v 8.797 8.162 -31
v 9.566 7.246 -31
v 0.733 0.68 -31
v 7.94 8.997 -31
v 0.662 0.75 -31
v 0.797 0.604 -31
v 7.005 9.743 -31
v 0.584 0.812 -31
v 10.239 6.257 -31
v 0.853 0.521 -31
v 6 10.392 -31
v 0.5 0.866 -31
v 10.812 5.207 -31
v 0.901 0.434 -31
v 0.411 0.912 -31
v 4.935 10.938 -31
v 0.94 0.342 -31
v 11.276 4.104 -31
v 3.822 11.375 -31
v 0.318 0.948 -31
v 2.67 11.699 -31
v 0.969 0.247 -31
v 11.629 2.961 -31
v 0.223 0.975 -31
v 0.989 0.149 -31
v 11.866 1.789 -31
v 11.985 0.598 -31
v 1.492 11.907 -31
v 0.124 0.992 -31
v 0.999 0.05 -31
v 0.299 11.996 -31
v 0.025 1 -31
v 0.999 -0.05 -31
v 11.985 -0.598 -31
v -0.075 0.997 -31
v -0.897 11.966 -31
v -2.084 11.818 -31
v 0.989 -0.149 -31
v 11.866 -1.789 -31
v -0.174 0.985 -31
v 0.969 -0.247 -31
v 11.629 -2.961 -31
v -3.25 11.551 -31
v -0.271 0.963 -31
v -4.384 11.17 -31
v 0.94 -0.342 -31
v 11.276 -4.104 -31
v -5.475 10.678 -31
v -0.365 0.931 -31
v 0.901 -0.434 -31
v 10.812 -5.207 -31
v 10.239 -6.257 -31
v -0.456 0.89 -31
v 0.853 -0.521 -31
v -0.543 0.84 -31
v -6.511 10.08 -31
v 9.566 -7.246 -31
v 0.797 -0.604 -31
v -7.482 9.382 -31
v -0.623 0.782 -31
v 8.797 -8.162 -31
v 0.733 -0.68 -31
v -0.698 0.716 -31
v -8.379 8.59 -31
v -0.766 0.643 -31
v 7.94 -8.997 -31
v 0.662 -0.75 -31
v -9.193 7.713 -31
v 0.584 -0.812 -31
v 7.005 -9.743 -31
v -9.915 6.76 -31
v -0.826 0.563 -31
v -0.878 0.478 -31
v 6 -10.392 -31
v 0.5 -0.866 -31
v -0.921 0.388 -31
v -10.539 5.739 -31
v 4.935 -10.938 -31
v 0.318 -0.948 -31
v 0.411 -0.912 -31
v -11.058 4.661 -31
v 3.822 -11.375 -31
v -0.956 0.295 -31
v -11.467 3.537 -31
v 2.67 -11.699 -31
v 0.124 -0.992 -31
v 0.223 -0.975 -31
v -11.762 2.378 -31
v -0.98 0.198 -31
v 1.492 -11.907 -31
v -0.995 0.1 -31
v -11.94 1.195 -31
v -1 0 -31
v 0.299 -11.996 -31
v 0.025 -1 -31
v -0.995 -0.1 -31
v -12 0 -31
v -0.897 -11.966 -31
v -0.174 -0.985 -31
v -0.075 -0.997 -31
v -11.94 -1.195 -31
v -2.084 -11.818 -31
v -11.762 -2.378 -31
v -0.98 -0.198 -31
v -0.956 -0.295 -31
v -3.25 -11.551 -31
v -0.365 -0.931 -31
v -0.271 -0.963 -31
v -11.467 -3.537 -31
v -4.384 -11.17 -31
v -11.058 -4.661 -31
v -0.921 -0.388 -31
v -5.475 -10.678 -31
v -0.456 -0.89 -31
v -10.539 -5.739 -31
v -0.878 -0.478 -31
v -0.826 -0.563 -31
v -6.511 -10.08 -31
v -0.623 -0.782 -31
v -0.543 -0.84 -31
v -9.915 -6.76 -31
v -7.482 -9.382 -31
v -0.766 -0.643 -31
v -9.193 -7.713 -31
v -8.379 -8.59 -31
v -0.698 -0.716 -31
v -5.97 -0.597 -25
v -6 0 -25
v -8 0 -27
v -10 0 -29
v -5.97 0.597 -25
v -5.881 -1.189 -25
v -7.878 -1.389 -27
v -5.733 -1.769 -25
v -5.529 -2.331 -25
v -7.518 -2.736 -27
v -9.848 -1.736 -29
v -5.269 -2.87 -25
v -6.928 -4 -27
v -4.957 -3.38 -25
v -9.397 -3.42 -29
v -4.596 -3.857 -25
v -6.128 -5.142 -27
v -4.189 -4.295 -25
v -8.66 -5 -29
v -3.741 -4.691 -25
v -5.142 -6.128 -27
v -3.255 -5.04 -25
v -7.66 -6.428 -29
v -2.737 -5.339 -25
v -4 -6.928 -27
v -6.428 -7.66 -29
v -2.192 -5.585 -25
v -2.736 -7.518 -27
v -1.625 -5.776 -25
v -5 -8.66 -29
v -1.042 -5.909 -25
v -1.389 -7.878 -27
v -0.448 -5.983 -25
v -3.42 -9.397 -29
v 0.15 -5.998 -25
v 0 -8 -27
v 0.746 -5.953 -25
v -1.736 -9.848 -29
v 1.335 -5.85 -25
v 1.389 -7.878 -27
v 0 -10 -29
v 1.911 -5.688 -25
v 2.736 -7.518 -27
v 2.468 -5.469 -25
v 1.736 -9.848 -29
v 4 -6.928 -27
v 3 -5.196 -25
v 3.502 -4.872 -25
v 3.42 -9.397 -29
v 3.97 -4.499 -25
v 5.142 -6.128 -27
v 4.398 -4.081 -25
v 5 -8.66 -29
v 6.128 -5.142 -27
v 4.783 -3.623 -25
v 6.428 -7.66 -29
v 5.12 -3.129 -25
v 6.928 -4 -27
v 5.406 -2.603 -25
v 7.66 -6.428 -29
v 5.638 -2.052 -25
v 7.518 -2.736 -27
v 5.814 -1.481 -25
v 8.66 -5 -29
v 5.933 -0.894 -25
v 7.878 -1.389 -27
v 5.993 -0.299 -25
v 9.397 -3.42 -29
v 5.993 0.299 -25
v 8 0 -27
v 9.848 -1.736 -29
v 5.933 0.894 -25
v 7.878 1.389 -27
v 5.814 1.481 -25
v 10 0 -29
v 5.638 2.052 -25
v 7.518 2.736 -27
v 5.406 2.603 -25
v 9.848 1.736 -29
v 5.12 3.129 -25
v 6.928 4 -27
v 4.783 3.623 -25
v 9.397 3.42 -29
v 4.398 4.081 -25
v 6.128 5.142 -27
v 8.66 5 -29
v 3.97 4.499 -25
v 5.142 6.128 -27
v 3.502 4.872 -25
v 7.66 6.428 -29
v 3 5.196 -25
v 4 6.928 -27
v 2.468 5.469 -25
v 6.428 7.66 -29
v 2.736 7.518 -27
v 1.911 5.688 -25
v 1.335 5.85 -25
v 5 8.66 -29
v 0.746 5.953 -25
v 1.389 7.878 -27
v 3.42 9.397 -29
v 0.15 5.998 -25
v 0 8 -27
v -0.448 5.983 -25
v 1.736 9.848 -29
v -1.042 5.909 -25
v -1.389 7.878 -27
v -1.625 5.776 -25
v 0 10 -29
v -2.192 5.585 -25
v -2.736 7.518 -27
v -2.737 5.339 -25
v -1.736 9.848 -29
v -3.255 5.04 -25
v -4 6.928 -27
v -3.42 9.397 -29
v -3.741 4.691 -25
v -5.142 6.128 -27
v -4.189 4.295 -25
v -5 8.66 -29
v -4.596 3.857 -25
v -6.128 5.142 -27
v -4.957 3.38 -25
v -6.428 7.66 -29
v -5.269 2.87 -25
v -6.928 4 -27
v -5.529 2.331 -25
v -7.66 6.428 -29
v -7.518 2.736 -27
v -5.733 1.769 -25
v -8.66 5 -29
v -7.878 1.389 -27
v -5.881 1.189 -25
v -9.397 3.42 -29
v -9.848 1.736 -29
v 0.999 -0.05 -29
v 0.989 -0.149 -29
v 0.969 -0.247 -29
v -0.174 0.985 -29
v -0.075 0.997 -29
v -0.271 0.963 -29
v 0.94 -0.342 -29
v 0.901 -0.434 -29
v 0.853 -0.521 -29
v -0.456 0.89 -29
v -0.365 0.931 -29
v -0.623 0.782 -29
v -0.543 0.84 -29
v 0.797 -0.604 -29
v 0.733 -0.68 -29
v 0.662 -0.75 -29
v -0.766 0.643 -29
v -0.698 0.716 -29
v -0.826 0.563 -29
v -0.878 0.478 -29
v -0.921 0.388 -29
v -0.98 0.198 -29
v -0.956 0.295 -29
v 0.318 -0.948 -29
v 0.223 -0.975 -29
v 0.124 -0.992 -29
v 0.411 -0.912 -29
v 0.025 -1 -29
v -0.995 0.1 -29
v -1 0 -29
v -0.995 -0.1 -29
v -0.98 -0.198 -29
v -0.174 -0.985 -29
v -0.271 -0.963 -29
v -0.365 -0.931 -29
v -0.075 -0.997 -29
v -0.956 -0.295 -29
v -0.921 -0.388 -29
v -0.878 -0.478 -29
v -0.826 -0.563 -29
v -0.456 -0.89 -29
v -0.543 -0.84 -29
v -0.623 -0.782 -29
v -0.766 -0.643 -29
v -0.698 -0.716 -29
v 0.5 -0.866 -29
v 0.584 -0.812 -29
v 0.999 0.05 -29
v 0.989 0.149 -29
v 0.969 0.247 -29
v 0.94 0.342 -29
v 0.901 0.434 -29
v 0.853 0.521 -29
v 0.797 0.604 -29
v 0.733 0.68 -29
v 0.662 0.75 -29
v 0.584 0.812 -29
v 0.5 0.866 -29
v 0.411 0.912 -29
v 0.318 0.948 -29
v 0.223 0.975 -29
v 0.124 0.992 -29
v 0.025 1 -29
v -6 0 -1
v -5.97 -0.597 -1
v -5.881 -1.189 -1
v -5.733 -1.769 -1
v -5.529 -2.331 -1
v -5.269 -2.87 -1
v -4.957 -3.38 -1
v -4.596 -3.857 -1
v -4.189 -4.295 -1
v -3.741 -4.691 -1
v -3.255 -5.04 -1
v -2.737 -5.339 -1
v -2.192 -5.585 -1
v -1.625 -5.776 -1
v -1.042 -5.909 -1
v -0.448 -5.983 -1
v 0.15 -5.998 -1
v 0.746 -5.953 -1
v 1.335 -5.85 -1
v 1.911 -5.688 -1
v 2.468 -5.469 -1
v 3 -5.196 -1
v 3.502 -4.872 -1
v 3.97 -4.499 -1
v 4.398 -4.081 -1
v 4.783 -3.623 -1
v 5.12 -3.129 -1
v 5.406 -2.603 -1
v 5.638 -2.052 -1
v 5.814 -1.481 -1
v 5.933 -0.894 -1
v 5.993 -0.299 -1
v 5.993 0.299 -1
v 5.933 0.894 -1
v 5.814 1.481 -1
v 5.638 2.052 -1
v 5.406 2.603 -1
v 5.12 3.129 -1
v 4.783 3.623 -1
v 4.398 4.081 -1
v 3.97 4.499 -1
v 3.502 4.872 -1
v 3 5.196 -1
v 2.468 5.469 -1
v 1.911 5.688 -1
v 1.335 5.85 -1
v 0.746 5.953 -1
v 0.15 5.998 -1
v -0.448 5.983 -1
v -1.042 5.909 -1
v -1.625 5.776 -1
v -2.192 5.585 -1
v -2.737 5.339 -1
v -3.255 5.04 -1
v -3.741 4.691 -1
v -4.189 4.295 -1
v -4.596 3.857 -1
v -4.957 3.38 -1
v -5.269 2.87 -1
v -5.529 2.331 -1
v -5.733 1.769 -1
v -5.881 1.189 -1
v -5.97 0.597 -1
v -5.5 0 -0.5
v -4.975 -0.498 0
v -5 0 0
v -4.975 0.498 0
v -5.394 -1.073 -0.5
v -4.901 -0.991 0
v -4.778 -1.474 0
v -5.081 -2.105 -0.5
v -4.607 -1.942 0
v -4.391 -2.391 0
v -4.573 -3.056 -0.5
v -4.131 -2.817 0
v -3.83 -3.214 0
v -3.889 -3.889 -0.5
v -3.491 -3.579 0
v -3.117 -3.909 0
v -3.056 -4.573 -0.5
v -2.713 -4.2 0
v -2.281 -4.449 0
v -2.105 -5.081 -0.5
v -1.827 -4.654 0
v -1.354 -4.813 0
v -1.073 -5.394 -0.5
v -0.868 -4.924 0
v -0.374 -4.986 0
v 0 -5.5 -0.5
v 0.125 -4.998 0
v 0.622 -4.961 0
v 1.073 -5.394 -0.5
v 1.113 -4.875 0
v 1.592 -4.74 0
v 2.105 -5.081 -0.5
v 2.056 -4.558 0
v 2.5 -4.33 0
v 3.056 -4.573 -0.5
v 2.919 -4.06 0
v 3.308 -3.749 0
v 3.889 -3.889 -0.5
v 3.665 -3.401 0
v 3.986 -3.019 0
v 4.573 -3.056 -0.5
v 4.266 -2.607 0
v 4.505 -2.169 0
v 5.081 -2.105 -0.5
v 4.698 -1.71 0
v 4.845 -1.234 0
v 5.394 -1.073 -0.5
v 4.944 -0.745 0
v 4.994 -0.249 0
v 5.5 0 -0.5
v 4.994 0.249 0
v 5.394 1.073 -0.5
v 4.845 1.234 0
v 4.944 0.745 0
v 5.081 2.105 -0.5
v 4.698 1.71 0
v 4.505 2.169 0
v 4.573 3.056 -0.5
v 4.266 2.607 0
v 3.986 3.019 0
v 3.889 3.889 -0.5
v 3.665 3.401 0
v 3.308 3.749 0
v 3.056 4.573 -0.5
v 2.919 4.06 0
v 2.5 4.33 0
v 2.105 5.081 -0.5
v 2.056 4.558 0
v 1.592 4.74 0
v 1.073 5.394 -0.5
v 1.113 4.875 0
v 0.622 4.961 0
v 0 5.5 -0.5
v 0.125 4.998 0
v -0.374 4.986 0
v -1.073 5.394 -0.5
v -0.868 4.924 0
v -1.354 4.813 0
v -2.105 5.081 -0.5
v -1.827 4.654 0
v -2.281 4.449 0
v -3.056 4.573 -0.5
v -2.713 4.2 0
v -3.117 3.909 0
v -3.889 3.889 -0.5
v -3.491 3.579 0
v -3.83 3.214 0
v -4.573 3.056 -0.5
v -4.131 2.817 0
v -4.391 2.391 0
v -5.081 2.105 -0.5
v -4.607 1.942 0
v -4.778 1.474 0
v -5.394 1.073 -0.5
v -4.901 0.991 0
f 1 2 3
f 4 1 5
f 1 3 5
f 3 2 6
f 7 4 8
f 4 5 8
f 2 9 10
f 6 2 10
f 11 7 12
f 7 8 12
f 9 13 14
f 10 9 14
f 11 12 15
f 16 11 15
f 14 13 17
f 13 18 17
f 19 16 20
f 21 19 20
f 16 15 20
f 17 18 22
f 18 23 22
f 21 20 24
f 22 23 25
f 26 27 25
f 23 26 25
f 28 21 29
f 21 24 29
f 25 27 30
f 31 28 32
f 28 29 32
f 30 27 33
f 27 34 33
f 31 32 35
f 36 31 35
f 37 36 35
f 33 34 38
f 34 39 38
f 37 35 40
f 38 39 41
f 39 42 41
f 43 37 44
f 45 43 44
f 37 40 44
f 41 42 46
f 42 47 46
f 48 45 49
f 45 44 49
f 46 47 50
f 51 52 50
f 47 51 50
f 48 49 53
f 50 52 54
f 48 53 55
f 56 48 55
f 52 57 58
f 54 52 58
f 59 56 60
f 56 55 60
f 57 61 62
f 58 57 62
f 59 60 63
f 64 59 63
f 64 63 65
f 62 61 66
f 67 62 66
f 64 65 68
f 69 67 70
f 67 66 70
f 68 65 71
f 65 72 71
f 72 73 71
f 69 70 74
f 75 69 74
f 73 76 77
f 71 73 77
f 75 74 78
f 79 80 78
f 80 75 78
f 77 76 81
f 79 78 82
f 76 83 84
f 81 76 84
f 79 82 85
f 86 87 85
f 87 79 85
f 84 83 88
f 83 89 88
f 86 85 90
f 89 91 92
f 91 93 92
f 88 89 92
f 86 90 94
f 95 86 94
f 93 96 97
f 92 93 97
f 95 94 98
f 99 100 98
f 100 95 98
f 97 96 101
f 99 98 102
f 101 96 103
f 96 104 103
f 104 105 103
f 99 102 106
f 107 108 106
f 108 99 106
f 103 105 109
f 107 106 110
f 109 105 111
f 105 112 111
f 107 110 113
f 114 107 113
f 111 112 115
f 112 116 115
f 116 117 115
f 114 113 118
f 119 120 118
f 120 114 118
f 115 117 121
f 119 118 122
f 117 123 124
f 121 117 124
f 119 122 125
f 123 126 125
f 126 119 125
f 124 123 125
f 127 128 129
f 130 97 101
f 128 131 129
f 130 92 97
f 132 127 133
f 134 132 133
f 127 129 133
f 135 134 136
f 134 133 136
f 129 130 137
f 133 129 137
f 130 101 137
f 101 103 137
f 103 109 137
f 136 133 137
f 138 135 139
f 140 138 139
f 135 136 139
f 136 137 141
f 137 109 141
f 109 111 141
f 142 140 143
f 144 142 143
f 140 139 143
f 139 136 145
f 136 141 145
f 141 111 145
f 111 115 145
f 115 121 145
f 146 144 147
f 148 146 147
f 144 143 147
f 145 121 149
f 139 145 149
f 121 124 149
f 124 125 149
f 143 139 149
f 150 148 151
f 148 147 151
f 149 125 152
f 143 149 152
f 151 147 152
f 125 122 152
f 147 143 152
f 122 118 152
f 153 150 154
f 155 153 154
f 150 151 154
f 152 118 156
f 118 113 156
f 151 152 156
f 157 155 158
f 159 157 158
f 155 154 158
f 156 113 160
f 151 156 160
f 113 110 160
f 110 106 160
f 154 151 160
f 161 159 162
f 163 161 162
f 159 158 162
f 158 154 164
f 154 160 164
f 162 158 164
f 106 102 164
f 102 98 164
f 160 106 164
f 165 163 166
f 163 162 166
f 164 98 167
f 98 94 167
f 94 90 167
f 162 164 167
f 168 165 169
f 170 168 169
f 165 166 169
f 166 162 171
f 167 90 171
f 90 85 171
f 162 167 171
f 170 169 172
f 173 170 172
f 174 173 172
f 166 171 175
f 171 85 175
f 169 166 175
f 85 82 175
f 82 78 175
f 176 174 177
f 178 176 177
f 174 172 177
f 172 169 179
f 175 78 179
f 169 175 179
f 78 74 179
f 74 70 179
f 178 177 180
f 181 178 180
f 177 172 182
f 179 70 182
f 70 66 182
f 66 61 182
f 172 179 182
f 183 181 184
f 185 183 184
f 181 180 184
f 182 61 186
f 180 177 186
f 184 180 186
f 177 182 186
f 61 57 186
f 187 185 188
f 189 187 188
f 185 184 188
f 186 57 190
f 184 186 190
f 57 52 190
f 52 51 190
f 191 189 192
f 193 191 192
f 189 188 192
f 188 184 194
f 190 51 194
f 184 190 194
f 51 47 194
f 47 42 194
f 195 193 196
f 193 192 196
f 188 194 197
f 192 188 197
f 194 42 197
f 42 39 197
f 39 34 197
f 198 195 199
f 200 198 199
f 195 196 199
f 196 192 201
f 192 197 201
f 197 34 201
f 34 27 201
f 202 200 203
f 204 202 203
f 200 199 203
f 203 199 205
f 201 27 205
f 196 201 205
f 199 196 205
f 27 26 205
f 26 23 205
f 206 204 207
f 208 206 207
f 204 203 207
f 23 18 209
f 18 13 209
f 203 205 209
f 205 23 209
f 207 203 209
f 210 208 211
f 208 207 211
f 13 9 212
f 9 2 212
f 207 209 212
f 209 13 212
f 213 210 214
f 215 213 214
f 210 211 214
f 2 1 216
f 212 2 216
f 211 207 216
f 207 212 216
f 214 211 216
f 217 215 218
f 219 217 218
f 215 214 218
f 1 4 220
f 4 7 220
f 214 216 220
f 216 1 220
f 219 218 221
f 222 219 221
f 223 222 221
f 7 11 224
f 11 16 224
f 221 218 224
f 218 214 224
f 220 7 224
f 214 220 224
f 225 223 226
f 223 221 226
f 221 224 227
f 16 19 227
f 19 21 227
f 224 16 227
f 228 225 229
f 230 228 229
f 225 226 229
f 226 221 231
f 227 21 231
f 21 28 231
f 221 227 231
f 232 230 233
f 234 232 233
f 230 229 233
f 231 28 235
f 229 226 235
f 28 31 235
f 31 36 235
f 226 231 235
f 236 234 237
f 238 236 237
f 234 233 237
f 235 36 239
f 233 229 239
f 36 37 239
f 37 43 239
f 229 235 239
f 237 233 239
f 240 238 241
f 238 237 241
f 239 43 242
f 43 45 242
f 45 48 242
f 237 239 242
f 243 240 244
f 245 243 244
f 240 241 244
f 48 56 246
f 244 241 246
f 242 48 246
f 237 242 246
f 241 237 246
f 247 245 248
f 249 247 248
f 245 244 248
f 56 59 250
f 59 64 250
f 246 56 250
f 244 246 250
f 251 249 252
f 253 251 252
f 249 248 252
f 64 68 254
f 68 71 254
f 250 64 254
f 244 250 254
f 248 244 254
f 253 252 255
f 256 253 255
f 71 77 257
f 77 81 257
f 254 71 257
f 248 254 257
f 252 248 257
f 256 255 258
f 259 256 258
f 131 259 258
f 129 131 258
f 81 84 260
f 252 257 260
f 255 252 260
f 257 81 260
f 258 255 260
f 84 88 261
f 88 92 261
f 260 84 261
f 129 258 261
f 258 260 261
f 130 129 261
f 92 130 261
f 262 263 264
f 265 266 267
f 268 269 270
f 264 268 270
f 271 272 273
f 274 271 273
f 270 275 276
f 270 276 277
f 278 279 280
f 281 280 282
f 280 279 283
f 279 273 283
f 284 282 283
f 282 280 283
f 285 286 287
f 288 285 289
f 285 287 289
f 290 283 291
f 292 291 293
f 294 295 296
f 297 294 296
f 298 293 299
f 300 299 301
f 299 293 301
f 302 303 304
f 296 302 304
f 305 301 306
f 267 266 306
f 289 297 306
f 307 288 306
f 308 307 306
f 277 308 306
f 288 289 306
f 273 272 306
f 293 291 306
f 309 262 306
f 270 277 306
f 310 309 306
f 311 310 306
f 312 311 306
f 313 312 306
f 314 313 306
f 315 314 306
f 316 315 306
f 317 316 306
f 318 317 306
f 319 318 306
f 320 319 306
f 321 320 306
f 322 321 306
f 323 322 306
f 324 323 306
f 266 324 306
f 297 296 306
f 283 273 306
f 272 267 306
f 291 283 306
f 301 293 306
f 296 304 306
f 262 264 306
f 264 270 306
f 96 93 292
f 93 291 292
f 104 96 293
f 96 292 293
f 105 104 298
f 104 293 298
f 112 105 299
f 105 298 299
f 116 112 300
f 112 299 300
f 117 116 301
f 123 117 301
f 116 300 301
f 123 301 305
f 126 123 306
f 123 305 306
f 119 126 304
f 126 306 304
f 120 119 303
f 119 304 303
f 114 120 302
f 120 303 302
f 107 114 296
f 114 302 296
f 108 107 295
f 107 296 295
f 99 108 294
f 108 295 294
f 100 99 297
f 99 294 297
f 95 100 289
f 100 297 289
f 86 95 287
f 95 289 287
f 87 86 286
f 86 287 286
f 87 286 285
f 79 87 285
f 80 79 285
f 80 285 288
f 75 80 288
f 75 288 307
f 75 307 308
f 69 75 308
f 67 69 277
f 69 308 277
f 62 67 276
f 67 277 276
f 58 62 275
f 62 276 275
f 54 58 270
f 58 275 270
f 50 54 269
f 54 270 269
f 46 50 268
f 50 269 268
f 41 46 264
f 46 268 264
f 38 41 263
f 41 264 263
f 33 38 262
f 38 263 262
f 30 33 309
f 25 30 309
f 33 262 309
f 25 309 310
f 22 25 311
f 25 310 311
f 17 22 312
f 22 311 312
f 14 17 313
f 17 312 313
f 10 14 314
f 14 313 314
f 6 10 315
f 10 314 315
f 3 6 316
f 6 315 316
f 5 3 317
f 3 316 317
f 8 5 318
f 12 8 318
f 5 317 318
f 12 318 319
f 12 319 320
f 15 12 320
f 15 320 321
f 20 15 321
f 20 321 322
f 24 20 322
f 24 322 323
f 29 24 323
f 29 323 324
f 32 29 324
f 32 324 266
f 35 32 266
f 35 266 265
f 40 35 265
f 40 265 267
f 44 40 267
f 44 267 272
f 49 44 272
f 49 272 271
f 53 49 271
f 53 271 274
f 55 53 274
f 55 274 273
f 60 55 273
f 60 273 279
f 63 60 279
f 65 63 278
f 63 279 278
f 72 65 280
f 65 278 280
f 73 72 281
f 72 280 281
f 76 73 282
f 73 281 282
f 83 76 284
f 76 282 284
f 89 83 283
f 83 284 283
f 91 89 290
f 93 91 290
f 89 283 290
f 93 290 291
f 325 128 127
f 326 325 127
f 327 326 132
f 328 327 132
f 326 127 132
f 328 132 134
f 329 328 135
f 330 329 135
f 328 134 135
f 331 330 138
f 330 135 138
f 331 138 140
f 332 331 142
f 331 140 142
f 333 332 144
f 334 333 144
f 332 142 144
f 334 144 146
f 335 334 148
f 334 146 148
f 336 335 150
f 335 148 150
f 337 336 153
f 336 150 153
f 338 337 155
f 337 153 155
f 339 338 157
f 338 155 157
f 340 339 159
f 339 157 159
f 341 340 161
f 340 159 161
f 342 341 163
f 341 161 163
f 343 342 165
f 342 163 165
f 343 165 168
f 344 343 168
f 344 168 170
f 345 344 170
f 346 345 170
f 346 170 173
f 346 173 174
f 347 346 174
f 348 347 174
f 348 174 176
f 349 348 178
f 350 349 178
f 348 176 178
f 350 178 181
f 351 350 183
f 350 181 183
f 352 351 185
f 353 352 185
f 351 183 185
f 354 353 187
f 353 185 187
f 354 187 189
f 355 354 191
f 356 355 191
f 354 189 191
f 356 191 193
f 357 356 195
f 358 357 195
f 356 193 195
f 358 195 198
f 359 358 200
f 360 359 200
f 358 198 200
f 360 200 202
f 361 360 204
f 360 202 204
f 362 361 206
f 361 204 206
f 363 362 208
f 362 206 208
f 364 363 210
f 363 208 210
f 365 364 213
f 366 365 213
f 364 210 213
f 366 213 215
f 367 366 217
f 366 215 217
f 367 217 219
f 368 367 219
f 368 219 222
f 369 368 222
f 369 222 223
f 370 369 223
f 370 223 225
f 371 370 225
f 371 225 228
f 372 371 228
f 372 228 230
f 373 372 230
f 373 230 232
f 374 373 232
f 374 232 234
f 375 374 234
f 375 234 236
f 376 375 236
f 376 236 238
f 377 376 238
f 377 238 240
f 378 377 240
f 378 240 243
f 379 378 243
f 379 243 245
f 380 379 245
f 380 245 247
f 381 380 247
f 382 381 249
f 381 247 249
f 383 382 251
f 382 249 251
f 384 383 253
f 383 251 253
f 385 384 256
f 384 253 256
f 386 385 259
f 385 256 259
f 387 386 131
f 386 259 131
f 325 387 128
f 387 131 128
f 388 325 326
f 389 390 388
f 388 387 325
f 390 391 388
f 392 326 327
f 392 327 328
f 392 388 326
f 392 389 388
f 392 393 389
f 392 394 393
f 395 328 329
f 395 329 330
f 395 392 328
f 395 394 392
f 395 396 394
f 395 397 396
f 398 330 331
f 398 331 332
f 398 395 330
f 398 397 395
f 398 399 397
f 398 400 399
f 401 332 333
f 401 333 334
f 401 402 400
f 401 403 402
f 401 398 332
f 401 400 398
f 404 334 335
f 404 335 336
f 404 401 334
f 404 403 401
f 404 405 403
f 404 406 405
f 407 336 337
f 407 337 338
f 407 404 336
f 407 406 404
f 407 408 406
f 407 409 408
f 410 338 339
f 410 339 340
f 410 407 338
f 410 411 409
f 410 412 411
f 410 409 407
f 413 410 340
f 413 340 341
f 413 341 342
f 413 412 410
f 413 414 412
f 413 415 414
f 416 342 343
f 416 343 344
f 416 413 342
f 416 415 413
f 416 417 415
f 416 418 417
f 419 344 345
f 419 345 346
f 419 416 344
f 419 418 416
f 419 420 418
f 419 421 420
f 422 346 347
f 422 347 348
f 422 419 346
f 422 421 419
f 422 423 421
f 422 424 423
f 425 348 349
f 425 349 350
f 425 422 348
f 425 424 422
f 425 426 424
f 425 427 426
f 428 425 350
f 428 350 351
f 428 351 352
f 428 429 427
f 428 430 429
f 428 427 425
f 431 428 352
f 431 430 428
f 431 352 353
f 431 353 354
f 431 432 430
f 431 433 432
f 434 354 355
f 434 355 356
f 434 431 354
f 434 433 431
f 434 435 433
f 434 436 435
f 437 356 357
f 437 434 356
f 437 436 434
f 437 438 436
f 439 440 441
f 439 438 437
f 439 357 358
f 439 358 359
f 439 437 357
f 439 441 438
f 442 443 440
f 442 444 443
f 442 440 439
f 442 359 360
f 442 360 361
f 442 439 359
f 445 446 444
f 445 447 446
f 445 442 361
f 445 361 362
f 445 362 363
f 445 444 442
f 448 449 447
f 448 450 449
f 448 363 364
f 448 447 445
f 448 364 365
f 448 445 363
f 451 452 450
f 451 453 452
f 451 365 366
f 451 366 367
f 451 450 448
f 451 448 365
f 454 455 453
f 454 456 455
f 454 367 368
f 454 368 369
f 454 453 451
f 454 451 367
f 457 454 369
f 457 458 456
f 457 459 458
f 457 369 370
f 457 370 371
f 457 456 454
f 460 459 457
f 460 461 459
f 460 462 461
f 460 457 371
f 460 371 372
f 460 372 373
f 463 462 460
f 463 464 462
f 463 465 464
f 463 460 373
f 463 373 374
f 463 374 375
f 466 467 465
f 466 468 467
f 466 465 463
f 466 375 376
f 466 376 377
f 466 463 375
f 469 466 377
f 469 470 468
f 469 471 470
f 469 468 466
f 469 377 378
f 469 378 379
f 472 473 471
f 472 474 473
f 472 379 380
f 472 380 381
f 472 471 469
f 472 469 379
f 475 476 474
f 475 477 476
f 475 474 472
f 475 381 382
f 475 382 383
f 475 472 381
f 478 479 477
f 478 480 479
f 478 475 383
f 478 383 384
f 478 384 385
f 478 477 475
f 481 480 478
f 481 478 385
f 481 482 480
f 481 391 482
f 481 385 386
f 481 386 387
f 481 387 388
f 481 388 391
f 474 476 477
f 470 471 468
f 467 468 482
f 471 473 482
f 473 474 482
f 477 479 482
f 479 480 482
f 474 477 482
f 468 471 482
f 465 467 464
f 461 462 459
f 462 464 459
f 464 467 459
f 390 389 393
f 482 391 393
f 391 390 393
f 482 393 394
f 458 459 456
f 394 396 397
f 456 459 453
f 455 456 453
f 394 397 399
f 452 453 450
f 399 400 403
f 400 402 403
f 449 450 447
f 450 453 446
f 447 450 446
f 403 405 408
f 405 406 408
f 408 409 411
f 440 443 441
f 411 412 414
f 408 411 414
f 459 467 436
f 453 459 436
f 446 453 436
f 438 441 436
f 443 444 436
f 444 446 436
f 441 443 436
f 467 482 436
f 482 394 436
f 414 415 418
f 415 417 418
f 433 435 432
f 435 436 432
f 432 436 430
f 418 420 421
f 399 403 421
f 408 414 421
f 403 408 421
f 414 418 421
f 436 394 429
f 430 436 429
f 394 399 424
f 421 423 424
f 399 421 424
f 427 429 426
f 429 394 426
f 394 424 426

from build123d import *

# Parameters (mm, degrees)
CHAMFER1_SIZE = 1


with BuildPart() as part:
    # Sketch1 → Revolve1 (revolve)
    with BuildSketch(Plane(origin=(0, 0, 0), x_dir=(1, 0, 0), z_dir=(0, 1, 0)), mode=Mode.PRIVATE) as revolve1_sk:
        Polygon((6, 0), (6, 25), (12, 31), (1, 31), (1, 29), (0, 29), (0, 0), align=None)
    revolve(revolve1_sk.sketch.rotate(Axis((0, 0, -48.72611465), (0, 0, 1)), 180), axis=Axis((0, 0, -48.72611465), (0, 0, 1)))

    # Chamfer1
    chamfer1_edges = [part.edges().sort_by_distance(p)[0] for p in [
        (6, 0, 0),
    ]]
    chamfer(chamfer1_edges, length=CHAMFER1_SIZE)


solid = part.part
